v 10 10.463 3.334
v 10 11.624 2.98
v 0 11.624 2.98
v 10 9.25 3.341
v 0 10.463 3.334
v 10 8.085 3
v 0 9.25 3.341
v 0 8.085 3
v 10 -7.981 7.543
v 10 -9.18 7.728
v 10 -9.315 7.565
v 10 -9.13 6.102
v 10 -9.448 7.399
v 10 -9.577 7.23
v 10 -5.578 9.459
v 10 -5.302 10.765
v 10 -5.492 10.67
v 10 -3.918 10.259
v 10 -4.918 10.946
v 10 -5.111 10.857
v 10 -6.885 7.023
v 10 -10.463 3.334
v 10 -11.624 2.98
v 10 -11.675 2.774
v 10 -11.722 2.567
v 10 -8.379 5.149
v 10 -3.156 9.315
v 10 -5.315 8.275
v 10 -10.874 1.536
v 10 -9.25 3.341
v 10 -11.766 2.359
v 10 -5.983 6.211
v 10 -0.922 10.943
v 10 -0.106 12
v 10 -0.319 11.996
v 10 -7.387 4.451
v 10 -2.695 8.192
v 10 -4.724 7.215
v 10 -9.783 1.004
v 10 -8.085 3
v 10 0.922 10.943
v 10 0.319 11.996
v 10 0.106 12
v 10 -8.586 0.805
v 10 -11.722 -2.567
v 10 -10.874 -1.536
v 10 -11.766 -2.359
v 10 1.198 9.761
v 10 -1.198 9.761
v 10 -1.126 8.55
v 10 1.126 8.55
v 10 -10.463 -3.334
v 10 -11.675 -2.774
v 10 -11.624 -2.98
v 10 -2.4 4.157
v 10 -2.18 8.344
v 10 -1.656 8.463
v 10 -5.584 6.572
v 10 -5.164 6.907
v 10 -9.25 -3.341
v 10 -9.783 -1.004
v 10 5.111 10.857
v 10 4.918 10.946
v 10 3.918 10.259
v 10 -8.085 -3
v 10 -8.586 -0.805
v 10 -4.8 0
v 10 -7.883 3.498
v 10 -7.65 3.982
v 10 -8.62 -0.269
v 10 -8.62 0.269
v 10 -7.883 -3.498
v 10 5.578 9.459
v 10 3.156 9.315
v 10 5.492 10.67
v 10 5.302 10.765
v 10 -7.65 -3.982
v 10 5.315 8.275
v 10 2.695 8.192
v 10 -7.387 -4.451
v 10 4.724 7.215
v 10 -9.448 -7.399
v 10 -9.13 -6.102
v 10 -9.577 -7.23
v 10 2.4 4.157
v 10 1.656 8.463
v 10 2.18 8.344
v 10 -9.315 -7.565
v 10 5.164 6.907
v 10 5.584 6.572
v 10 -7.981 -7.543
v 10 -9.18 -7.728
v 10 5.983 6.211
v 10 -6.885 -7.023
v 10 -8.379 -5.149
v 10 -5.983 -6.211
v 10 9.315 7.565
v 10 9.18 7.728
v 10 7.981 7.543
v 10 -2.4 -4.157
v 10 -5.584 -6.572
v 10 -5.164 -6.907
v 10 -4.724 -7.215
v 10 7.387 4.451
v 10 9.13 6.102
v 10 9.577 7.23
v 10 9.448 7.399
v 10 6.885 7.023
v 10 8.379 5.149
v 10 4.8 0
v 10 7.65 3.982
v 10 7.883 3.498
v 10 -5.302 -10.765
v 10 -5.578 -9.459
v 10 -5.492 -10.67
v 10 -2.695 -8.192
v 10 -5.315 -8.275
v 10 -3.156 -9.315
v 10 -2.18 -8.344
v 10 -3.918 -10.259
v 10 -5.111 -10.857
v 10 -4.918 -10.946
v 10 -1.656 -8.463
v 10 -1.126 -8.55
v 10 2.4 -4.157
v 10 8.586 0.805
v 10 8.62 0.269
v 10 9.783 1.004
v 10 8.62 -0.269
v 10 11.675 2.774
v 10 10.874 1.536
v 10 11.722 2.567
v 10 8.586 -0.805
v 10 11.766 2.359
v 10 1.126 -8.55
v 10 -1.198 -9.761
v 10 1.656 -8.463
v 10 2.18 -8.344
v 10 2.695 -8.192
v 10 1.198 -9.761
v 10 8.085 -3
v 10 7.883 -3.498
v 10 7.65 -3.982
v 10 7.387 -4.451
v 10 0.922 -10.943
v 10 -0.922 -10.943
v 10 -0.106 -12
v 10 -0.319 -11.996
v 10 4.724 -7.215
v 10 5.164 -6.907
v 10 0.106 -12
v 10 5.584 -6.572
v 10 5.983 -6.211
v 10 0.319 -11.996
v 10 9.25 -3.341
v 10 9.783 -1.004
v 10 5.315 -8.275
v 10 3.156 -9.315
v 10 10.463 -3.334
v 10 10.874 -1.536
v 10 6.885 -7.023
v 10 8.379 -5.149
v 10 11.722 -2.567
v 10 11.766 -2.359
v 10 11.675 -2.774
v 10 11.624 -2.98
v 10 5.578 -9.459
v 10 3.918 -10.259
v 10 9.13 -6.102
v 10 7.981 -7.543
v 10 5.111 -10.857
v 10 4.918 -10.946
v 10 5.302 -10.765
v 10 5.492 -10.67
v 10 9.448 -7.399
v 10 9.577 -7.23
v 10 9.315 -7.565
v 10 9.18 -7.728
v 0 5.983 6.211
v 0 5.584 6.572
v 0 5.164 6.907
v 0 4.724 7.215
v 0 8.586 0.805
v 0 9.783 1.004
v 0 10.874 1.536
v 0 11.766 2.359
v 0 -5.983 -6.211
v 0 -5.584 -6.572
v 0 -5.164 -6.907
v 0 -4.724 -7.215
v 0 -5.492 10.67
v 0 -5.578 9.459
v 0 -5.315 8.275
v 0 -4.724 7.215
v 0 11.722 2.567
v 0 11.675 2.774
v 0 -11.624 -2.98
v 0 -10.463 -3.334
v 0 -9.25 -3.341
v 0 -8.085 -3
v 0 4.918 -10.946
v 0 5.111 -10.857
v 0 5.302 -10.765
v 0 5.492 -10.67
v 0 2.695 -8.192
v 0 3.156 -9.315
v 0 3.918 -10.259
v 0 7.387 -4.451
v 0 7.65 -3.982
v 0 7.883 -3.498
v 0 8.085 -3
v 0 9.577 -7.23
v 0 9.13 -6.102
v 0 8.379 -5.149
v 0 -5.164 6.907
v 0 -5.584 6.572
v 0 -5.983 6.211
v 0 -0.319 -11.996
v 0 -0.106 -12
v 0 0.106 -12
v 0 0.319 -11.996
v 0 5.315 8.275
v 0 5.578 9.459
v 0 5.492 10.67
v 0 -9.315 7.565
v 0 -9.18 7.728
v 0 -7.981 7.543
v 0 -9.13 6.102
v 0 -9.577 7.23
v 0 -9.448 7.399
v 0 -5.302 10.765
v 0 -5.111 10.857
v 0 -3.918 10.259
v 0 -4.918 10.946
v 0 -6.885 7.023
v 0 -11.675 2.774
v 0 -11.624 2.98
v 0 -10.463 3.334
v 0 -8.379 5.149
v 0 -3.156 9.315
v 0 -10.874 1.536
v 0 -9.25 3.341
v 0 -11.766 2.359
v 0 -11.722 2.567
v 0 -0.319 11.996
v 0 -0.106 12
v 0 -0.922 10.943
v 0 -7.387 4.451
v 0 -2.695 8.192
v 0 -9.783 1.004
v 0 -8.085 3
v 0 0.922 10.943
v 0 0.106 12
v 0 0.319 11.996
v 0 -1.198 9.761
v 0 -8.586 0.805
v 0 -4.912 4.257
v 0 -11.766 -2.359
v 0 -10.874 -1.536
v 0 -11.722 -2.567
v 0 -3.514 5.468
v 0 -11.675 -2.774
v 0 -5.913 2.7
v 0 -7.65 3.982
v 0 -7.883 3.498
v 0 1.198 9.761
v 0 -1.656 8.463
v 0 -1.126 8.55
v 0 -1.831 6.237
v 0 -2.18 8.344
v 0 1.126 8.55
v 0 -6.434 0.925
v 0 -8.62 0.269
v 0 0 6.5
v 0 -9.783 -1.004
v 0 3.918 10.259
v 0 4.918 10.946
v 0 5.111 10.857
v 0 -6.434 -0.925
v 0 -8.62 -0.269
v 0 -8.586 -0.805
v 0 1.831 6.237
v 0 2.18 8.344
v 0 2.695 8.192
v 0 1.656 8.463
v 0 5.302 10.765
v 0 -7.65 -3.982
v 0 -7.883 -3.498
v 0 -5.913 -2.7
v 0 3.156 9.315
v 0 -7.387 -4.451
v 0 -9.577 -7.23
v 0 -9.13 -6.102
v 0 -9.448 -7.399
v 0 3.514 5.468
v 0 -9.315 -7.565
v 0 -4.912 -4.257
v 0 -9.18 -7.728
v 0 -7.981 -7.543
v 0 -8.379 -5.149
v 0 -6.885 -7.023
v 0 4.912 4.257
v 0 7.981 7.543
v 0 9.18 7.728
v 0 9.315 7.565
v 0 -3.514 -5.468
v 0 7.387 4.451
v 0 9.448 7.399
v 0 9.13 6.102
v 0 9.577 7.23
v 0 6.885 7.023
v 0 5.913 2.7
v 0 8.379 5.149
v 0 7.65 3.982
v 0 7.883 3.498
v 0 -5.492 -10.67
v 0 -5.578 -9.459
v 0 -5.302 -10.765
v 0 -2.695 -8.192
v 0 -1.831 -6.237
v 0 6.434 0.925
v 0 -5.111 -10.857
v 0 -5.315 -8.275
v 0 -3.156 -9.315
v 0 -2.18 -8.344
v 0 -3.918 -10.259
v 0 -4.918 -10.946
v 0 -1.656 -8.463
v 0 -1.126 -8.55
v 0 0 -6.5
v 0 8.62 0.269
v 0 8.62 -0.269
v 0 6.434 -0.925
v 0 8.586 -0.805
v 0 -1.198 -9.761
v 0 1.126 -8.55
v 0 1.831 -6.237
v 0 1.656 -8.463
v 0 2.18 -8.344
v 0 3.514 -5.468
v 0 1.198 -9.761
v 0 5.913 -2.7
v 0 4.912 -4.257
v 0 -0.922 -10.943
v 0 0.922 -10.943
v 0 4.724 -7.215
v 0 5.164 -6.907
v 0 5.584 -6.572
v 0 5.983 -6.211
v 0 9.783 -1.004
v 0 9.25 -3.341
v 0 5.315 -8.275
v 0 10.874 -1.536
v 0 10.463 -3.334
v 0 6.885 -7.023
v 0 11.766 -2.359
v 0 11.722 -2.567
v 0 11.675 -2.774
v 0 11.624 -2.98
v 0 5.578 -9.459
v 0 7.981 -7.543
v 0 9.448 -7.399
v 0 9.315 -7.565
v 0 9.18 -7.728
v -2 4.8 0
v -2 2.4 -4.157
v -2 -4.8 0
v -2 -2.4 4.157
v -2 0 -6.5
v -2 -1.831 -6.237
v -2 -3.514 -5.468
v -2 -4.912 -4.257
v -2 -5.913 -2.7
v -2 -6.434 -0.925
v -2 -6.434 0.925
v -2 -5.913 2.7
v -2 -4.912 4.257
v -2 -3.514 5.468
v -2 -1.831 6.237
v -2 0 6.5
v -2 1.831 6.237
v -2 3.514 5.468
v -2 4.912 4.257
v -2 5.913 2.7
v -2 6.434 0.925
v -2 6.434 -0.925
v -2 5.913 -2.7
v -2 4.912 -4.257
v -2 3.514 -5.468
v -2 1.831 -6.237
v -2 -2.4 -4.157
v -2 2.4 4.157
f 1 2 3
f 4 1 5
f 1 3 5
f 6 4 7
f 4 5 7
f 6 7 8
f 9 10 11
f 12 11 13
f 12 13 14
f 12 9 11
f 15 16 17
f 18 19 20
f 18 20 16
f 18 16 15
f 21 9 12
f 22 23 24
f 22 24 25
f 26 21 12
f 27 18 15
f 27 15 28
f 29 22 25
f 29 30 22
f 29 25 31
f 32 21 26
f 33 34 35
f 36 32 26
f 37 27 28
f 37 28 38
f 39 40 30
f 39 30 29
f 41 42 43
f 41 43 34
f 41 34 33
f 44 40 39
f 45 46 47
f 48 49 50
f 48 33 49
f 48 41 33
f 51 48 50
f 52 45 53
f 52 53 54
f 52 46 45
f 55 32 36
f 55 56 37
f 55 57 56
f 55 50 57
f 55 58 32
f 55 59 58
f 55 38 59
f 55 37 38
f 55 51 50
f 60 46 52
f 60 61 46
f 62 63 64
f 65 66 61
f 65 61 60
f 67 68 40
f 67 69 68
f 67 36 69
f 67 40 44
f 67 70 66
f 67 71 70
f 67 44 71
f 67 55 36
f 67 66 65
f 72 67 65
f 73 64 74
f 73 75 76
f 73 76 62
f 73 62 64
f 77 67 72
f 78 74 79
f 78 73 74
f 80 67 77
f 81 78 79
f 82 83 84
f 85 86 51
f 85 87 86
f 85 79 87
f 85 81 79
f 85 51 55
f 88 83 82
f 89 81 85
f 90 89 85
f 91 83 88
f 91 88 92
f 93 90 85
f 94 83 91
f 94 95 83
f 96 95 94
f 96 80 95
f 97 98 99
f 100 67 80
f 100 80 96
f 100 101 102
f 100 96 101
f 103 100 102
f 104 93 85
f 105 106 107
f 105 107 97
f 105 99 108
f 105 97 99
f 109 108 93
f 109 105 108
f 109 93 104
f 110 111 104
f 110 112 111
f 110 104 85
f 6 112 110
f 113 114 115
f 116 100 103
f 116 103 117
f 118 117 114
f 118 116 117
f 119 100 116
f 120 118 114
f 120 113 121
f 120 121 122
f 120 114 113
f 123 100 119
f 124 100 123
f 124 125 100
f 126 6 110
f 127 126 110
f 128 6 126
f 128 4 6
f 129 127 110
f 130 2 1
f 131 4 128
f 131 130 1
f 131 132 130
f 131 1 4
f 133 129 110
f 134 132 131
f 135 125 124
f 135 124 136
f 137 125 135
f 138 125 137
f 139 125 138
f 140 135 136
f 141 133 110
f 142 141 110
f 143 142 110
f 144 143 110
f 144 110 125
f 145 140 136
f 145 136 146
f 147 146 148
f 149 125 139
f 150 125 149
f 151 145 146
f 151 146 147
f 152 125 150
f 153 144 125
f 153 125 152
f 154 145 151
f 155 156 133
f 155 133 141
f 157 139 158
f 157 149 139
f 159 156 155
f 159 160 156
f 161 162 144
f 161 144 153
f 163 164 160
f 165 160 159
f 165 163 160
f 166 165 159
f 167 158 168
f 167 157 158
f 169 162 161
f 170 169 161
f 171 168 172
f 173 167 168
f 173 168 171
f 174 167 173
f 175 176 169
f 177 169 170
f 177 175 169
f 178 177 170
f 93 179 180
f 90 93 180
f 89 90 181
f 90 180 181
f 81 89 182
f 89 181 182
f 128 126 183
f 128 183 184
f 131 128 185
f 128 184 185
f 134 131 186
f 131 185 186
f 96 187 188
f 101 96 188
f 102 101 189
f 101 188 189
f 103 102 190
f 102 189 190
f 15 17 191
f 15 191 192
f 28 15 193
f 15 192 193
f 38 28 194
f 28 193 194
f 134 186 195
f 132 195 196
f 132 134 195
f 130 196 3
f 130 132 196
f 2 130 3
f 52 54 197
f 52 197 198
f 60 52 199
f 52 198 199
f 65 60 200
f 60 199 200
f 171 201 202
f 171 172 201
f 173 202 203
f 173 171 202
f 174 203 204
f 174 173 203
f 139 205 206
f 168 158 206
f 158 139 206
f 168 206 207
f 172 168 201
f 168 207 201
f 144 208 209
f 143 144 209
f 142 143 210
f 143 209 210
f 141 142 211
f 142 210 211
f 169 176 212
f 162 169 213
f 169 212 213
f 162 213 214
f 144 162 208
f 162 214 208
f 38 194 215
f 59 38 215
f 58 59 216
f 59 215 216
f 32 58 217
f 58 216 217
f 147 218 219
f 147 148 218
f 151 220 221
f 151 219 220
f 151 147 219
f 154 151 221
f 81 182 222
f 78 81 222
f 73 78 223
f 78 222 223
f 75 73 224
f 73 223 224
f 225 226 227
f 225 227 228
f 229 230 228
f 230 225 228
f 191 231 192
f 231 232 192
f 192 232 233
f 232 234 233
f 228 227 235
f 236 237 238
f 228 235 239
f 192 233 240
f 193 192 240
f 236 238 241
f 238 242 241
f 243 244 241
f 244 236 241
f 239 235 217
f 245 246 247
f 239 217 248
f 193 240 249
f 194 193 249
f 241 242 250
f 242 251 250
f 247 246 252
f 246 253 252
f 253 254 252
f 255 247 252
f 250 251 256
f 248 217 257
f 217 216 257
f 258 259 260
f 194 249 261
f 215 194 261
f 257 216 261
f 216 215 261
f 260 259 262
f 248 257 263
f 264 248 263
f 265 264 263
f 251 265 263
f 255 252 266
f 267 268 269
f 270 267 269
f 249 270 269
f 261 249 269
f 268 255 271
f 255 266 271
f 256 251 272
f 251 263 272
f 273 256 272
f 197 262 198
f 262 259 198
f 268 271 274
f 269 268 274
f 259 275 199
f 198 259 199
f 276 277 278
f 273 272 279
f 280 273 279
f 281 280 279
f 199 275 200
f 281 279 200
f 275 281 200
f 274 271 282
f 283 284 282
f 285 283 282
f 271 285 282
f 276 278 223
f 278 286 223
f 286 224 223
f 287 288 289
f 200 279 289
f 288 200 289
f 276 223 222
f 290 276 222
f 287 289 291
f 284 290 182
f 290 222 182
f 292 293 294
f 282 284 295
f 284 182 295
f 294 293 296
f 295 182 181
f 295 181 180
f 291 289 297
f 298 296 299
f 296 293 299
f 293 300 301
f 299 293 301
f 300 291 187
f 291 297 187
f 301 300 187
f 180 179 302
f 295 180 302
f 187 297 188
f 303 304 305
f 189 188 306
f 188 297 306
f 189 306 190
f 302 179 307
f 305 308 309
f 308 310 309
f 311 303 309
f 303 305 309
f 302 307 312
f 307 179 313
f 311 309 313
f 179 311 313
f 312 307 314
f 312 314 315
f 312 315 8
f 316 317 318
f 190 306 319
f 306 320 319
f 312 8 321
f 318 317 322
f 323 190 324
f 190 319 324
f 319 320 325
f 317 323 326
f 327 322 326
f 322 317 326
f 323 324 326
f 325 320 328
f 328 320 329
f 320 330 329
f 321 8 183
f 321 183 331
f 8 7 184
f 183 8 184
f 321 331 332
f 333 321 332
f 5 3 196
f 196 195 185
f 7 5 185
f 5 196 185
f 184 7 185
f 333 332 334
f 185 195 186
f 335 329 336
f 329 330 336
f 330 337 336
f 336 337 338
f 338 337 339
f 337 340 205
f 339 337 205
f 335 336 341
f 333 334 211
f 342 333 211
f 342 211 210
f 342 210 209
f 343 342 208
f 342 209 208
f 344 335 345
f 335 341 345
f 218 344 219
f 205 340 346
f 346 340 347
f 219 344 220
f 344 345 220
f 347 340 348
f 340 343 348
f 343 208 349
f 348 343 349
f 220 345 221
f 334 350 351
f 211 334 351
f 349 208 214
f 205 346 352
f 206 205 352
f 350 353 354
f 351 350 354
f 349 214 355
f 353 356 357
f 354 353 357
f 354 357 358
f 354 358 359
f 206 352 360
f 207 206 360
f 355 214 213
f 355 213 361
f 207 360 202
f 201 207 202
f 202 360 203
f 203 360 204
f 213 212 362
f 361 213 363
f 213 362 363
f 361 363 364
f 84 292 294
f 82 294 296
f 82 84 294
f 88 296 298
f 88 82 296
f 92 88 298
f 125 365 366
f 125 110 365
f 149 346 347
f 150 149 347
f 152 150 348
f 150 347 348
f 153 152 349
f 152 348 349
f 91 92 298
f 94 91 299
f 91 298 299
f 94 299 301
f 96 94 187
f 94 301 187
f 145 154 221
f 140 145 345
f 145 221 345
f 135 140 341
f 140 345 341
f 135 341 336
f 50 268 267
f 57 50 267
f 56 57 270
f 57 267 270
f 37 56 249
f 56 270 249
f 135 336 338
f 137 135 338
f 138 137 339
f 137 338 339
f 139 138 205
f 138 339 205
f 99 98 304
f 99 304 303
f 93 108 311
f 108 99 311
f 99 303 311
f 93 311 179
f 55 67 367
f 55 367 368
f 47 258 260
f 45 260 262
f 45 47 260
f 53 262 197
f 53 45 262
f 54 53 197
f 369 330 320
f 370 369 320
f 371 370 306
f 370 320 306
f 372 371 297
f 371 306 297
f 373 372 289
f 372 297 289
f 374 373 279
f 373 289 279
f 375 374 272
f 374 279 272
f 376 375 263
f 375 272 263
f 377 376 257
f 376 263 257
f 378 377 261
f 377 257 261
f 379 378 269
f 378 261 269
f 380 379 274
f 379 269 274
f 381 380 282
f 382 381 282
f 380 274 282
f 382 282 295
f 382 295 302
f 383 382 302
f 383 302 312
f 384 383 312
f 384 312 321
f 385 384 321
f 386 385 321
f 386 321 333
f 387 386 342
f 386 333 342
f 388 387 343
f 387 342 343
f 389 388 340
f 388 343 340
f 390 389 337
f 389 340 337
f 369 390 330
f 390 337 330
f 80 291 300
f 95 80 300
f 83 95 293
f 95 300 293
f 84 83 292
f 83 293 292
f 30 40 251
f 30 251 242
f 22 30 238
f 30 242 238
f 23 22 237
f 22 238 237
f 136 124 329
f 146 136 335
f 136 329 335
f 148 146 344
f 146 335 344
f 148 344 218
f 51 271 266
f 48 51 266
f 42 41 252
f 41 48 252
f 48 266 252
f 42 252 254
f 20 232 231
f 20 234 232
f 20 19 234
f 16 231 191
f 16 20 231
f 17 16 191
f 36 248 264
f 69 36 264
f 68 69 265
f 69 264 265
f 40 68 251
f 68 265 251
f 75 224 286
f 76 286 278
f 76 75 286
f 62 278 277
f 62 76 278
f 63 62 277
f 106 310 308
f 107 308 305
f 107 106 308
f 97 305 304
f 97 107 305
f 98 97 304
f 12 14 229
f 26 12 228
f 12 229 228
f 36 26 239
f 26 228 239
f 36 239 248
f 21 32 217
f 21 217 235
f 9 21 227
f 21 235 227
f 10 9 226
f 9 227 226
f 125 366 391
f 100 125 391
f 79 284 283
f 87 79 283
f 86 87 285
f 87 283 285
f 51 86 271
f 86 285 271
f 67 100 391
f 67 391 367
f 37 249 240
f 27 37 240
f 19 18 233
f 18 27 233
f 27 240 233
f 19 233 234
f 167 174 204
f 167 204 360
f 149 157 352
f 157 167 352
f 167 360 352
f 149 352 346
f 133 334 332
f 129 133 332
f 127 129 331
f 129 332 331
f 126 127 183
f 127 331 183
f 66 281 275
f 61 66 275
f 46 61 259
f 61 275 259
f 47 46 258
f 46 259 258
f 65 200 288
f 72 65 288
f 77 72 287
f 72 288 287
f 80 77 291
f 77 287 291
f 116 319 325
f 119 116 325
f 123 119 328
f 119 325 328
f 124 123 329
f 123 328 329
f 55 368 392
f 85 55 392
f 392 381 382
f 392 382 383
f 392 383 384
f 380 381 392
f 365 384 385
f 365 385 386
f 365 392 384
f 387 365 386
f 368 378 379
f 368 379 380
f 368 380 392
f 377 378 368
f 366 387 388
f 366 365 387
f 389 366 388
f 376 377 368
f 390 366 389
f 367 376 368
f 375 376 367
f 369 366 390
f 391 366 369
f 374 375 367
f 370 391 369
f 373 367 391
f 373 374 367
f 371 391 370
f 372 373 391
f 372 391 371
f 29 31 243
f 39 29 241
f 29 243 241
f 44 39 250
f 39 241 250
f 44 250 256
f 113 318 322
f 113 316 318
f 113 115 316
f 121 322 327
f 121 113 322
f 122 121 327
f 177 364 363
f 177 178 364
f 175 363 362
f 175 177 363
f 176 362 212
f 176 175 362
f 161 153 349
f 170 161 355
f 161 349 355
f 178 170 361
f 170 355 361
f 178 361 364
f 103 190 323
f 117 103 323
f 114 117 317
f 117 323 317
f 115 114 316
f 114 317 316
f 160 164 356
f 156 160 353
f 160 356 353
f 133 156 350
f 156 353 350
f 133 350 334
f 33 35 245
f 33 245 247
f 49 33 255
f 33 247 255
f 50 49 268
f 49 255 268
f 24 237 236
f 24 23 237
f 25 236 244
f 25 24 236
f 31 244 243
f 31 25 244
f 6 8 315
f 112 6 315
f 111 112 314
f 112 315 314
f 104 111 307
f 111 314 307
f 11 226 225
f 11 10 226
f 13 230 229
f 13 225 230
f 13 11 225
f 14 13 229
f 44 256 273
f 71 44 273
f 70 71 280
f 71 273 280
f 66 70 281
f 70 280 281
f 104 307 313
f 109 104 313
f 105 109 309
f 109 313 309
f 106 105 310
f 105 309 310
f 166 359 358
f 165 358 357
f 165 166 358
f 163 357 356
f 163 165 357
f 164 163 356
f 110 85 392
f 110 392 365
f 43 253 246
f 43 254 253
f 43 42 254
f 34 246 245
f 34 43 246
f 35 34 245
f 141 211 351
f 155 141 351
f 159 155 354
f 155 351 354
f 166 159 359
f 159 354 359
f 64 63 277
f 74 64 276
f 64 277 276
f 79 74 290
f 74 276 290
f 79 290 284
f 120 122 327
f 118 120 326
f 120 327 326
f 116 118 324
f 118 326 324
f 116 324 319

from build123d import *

# Parameters (mm, degrees)
BASPROSKE_W              = 15
BASPROSKE_H              = 12
TOOTHCUT_DEPTH           = 23.649503306
TEETHCUTS_COUNT          = 14
TEETHCUTS_ANGLE          = 334.285714286
BORSKE_R                 = 4
BORE_DEPTH               = 50.0000508
ESBO_O3_R                = 4
ESBO_O3_R_2              = 3
RESSALTO_EXTRUS_O2_DEPTH = 15
ESBO_O4_R                = 14.250212497
CORTE_EXTRUS_O2_DEPTH    = 5
CORTE_EXTRUS_O3_DEPTH    = 20.555988541
ESBO_O7_R                = 6.5
RESSALTO_EXTRUS_O4_DEPTH = 2


with BuildPart() as part:
    # BasProSke → Base-Revolve (revolve)
    with BuildSketch(Plane(origin=(0, 0, 0), x_dir=(1, 0, 0), z_dir=(0, 1, 0)), mode=Mode.PRIVATE) as base_revolve_sk:
        with Locations((7.5, 6)):
            Rectangle(BASPROSKE_W, BASPROSKE_H)
    revolve(base_revolve_sk.sketch.rotate(Axis((-10, 0, 0), (1, 0, 0)), 180), axis=Axis((-10, 0, 0), (1, 0, 0)))

    # TooCutSke → ToothCut (cut, through all)
    with BuildSketch(Plane(origin=(0, 0, 0), x_dir=(0, 0, -1), z_dir=(1, 0, 0))):
        with BuildLine():
            ThreePointArc((0.804845511, 8.586361261), (0, 8.624), (-0.804845511, 8.586361261))
            ThreePointArc((-0.804845511, 8.586361261), (-1.237812142, 10.362618414), (-2.384428228, 11.78663426))
            ThreePointArc((-2.384428228, 11.78663426), (0, 12.0254), (2.384428228, 11.78663426))
            ThreePointArc((2.384428228, 11.78663426), (1.237812142, 10.362618414), (0.804845511, 8.586361261))
        make_face()
    toothcut = extrude(amount=TOOTHCUT_DEPTH, mode=Mode.SUBTRACT)

    # TeethCuts: ToothCut ×14 about axis
    teethcuts_axis = Axis((-10, 0, 0), (1, 0, 0))
    for i in range(1, TEETHCUTS_COUNT):
        add(toothcut.rotate(teethcuts_axis, i * TEETHCUTS_ANGLE / (TEETHCUTS_COUNT - 1)), mode=Mode.SUBTRACT)

    # BorSke → Bore (cut, symmetric)
    with BuildSketch(Plane(origin=(0, 0, 0), x_dir=(0, 0, -1), z_dir=(1, 0, 0))):
        with Locations(Location((0, 0, 0), (0, 0, 180))):
            Circle(BORSKE_R)
    extrude(amount=BORE_DEPTH, both=True, mode=Mode.SUBTRACT)

    # Esboço3 → Ressalto-extrusão2 (add)
    with BuildSketch(Plane(origin=(15, 0, 0), x_dir=(0, 0, -1), z_dir=(1, 0, 0))):
        Circle(ESBO_O3_R)
        Circle(ESBO_O3_R_2, mode=Mode.SUBTRACT)
    extrude(amount=-RESSALTO_EXTRUS_O2_DEPTH)

    # Esboço4 → Corte-extrusão2 (cut)
    with BuildSketch(Plane(origin=(15, 0, 0), x_dir=(0, 0, -1), z_dir=(1, 0, 0))):
        Circle(ESBO_O4_R)
    extrude(amount=-CORTE_EXTRUS_O2_DEPTH, mode=Mode.SUBTRACT)

    # Esboço5 → Corte-extrusão3 (cut, through all)
    with BuildSketch(Plane.ZY):
        Polygon((4.156921938, 2.4), (0, 4.8), (-4.156921938, 2.4), (-4.156921938, -2.4), (0, -4.8), (4.156921938, -2.4), align=None)
    extrude(amount=-CORTE_EXTRUS_O3_DEPTH, mode=Mode.SUBTRACT)

    # Esboço7 → Ressalto-extrusão4 (add)
    with BuildSketch(Plane.ZY):
        with Locations(Location((0, 0, 0), (0, 0, 180))):
            Circle(ESBO_O7_R)
        Polygon((0, 4.8), (-4.156921938, 2.4), (-4.156921938, -2.4), (0, -4.8), (4.156921938, -2.4), (4.156921938, 2.4), align=None, mode=Mode.SUBTRACT)
    extrude(amount=RESSALTO_EXTRUS_O4_DEPTH)


solid = part.part
